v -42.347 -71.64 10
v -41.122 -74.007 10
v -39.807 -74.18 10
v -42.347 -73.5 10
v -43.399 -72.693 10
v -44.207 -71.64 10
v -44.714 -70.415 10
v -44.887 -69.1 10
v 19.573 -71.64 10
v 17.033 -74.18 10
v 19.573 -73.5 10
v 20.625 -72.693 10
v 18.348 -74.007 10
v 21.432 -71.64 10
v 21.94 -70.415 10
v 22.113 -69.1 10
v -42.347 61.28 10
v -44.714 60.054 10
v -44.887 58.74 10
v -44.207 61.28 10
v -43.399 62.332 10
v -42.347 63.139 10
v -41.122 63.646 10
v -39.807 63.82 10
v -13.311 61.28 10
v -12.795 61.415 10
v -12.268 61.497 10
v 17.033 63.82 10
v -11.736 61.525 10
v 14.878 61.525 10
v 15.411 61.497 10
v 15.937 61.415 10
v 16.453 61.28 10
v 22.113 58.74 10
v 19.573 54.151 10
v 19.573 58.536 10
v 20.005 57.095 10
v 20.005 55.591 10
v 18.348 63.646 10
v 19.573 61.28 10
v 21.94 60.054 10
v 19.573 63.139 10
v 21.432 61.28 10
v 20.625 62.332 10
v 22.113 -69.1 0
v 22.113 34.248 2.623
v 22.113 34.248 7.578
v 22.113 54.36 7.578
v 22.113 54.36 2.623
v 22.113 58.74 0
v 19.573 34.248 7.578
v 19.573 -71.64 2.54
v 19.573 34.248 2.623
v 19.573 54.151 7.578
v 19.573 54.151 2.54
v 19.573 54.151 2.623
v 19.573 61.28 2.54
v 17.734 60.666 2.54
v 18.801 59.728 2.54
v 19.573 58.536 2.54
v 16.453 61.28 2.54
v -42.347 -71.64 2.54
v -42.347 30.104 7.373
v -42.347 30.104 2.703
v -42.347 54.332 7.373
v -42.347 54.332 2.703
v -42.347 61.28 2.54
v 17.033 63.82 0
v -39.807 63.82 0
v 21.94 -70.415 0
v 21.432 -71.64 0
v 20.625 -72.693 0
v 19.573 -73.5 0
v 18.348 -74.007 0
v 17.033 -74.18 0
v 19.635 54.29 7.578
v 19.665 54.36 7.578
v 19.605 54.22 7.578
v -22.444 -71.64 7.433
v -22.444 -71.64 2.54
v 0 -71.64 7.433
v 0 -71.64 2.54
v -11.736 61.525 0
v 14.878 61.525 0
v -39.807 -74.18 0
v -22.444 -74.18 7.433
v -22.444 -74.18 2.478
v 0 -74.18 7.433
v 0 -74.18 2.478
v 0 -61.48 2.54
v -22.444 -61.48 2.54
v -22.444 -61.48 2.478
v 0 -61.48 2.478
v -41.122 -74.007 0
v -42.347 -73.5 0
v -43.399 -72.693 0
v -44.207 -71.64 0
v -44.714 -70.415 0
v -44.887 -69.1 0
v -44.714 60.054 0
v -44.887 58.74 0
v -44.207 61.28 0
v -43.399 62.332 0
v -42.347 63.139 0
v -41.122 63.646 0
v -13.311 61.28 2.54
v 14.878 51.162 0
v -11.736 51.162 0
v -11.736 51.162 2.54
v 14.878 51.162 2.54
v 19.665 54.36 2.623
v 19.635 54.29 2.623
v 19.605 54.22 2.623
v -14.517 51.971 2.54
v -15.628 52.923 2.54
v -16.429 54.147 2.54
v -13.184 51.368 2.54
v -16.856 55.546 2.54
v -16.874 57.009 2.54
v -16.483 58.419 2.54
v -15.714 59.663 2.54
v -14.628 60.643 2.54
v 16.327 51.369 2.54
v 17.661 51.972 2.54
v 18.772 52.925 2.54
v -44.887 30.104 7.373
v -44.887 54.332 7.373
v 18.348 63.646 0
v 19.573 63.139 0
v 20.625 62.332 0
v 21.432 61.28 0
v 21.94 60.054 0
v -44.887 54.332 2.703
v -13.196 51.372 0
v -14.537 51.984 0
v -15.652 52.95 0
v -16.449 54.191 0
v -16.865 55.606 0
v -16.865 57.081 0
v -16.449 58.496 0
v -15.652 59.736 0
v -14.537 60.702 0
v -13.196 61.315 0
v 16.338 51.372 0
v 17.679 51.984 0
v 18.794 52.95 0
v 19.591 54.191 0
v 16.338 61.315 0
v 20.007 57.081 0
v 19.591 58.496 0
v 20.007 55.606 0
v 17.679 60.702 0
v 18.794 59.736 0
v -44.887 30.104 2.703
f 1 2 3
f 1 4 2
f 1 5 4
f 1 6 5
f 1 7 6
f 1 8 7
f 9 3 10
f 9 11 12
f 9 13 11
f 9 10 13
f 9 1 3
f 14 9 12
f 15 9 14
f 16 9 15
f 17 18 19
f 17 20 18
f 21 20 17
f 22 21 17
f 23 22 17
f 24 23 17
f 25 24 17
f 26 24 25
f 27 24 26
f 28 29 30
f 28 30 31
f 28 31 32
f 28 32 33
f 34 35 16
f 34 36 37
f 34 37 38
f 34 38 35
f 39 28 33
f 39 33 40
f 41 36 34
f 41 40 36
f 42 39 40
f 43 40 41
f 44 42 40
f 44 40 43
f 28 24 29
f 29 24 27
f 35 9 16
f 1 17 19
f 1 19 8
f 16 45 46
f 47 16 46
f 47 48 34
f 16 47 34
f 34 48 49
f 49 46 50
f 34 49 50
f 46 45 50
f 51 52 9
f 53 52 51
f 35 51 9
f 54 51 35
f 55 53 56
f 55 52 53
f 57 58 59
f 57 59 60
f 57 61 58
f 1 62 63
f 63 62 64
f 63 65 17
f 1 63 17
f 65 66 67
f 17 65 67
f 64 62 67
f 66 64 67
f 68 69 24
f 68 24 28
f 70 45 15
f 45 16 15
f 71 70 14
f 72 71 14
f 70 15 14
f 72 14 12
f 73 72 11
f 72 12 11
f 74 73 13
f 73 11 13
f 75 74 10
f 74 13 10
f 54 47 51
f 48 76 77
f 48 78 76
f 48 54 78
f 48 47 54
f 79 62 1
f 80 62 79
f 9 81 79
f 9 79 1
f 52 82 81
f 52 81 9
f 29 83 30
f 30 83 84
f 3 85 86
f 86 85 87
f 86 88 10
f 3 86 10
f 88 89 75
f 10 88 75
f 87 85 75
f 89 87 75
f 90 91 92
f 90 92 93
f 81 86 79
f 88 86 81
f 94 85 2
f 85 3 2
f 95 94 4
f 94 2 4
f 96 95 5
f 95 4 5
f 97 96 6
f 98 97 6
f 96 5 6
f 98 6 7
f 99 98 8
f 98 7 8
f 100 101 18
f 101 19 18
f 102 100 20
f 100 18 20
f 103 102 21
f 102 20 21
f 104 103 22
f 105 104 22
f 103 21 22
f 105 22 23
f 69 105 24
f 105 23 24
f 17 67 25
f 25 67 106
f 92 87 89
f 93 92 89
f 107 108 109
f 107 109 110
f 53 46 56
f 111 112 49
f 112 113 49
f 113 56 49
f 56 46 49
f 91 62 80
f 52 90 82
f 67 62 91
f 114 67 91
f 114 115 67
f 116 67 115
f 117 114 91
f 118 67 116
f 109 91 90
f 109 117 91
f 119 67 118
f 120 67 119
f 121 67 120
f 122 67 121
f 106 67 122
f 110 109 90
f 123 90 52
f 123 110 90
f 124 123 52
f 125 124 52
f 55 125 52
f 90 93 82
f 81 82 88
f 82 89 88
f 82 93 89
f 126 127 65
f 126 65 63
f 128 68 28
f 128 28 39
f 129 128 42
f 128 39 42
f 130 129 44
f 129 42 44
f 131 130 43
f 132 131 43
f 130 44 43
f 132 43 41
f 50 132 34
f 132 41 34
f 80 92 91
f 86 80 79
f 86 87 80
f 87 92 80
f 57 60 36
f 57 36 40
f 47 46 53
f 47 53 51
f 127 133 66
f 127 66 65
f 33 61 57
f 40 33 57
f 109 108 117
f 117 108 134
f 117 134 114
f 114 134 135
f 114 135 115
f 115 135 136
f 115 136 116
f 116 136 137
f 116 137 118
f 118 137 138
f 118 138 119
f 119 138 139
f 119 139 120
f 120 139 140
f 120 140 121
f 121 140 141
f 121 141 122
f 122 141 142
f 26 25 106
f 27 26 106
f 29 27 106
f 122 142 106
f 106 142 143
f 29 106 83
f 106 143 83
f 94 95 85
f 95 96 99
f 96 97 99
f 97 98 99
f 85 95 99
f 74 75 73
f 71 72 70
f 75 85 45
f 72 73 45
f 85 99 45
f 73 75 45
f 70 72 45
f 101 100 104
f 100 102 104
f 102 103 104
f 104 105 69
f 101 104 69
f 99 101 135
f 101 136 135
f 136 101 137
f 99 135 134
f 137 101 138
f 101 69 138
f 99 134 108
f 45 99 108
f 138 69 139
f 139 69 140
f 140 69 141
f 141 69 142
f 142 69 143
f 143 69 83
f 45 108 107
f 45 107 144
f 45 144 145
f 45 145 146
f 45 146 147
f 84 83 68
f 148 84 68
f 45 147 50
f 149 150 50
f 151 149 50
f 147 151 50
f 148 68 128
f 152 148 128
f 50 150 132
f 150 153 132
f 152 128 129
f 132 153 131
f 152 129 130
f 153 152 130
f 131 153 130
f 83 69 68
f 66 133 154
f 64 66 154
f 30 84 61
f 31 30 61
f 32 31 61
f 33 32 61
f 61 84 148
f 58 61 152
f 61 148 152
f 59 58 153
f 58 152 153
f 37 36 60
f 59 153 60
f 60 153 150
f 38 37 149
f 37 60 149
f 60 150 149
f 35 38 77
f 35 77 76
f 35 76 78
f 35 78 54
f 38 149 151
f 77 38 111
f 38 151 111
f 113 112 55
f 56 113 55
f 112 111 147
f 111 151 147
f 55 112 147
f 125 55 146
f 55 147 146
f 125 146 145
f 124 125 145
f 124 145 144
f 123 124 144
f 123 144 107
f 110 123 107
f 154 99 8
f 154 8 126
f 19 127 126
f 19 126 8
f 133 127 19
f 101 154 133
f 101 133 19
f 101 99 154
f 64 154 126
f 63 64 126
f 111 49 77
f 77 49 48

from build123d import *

# Parameters (mm, degrees)
F0_W      = 67
F0_H      = 138
F1_DEPTH  = 10
F2_T      = -2.54
F3_R      = 5.08
F4_R      = 5.08
F5_R      = 5.08
F6_R      = 5.08
F7_W      = 26.614272967
F7_H      = 10.362688452
F8_DEPTH  = 25.4
F9_W      = 22.4436074495
F9_H      = 4.9550822005
F10_DEPTH = 12.7
F11_W     = 24.2274198681
F11_H     = 4.6703449916
F12_DEPTH = 25.4
F13_W     = 20.1118066907
F13_H     = 4.9550810363
F14_DEPTH = 25.4


with BuildPart() as f1:
    # F0 (on Top) → F1 (new body)
    with BuildSketch(Plane.XY):
        with Locations((-11.3872148991, -5.1804912686)):
            Rectangle(F0_W, F0_H)
    extrude(amount=F1_DEPTH)

    # F2
    f2_openings = [f1.faces().sort_by_distance(p)[0] for p in [
        (-11.387215, -5.180491, 10),
    ]]
    offset(amount=F2_T, openings=f2_openings)

    # F3
    f3_edges = [f1.edges().sort_by_distance(p)[0] for p in [
        (-44.887215, 63.819509, 5),
    ]]
    fillet(f3_edges, radius=F3_R)

    # F4
    f4_edges = [f1.edges().sort_by_distance(p)[0] for p in [
        (22.112785, 63.819509, 5),
    ]]
    fillet(f4_edges, radius=F4_R)

    # F5
    f5_edges = [f1.edges().sort_by_distance(p)[0] for p in [
        (22.112785, -74.180491, 5),
    ]]
    fillet(f5_edges, radius=F5_R)

    # F6
    f6_edges = [f1.edges().sort_by_distance(p)[0] for p in [
        (-44.887215, -74.180491, 5),
    ]]
    fillet(f6_edges, radius=F6_R)

    # F7 (on face) → F8 (cut)
    with BuildSketch(Plane(origin=(0, 0, 0), x_dir=(1, 0, 0), z_dir=(0, 0, -1))):
        with Locations((1.5710769221, -56.3431996852)):
            Rectangle(F7_W, F7_H)
        with BuildLine():
            Line((14.8782134056, -51.1618554592), (14.8782134056, -61.5245439112))
            ThreePointArc((14.8782134056, -61.5245439112), (20.0595576316, -56.3431996852), (14.8782134056, -51.1618554592))
        make_face()
        with BuildLine():
            ThreePointArc((-11.7360595614, -51.1618554592), (-16.9174037874, -56.3431996852), (-11.7360595614, -61.5245439112))
            Line((-11.7360595614, -61.5245439112), (-11.7360595614, -51.1618554592))
        make_face()
    extrude(amount=-F8_DEPTH, mode=Mode.SUBTRACT)

    # F9 (on face) → F10 (cut, symmetric)
    with BuildSketch(Plane.XZ.offset(74.1804912686)):
        with Locations((-11.2218037248, 4.9550822005)):
            Rectangle(F9_W, F9_H)
    extrude(amount=F10_DEPTH, both=True, mode=Mode.SUBTRACT)

    # F11 (on face) → F12 (cut)
    with BuildSketch(Plane(origin=(-44.8872148991, 0, 0), x_dir=(0, -1, 0), z_dir=(-1, 0, 0))):
        with Locations((-42.2179875895, 5.0382829504)):
            Rectangle(F11_W, F11_H)
    extrude(amount=-F12_DEPTH, mode=Mode.SUBTRACT)

    # F13 (on face) → F14 (cut)
    with BuildSketch(Plane.YZ.offset(22.1127851009)):
        with Locations((44.3042628467, 5.1008212613)):
            Rectangle(F13_W, F13_H)
    extrude(amount=-F14_DEPTH, mode=Mode.SUBTRACT)


solid = f1.part
